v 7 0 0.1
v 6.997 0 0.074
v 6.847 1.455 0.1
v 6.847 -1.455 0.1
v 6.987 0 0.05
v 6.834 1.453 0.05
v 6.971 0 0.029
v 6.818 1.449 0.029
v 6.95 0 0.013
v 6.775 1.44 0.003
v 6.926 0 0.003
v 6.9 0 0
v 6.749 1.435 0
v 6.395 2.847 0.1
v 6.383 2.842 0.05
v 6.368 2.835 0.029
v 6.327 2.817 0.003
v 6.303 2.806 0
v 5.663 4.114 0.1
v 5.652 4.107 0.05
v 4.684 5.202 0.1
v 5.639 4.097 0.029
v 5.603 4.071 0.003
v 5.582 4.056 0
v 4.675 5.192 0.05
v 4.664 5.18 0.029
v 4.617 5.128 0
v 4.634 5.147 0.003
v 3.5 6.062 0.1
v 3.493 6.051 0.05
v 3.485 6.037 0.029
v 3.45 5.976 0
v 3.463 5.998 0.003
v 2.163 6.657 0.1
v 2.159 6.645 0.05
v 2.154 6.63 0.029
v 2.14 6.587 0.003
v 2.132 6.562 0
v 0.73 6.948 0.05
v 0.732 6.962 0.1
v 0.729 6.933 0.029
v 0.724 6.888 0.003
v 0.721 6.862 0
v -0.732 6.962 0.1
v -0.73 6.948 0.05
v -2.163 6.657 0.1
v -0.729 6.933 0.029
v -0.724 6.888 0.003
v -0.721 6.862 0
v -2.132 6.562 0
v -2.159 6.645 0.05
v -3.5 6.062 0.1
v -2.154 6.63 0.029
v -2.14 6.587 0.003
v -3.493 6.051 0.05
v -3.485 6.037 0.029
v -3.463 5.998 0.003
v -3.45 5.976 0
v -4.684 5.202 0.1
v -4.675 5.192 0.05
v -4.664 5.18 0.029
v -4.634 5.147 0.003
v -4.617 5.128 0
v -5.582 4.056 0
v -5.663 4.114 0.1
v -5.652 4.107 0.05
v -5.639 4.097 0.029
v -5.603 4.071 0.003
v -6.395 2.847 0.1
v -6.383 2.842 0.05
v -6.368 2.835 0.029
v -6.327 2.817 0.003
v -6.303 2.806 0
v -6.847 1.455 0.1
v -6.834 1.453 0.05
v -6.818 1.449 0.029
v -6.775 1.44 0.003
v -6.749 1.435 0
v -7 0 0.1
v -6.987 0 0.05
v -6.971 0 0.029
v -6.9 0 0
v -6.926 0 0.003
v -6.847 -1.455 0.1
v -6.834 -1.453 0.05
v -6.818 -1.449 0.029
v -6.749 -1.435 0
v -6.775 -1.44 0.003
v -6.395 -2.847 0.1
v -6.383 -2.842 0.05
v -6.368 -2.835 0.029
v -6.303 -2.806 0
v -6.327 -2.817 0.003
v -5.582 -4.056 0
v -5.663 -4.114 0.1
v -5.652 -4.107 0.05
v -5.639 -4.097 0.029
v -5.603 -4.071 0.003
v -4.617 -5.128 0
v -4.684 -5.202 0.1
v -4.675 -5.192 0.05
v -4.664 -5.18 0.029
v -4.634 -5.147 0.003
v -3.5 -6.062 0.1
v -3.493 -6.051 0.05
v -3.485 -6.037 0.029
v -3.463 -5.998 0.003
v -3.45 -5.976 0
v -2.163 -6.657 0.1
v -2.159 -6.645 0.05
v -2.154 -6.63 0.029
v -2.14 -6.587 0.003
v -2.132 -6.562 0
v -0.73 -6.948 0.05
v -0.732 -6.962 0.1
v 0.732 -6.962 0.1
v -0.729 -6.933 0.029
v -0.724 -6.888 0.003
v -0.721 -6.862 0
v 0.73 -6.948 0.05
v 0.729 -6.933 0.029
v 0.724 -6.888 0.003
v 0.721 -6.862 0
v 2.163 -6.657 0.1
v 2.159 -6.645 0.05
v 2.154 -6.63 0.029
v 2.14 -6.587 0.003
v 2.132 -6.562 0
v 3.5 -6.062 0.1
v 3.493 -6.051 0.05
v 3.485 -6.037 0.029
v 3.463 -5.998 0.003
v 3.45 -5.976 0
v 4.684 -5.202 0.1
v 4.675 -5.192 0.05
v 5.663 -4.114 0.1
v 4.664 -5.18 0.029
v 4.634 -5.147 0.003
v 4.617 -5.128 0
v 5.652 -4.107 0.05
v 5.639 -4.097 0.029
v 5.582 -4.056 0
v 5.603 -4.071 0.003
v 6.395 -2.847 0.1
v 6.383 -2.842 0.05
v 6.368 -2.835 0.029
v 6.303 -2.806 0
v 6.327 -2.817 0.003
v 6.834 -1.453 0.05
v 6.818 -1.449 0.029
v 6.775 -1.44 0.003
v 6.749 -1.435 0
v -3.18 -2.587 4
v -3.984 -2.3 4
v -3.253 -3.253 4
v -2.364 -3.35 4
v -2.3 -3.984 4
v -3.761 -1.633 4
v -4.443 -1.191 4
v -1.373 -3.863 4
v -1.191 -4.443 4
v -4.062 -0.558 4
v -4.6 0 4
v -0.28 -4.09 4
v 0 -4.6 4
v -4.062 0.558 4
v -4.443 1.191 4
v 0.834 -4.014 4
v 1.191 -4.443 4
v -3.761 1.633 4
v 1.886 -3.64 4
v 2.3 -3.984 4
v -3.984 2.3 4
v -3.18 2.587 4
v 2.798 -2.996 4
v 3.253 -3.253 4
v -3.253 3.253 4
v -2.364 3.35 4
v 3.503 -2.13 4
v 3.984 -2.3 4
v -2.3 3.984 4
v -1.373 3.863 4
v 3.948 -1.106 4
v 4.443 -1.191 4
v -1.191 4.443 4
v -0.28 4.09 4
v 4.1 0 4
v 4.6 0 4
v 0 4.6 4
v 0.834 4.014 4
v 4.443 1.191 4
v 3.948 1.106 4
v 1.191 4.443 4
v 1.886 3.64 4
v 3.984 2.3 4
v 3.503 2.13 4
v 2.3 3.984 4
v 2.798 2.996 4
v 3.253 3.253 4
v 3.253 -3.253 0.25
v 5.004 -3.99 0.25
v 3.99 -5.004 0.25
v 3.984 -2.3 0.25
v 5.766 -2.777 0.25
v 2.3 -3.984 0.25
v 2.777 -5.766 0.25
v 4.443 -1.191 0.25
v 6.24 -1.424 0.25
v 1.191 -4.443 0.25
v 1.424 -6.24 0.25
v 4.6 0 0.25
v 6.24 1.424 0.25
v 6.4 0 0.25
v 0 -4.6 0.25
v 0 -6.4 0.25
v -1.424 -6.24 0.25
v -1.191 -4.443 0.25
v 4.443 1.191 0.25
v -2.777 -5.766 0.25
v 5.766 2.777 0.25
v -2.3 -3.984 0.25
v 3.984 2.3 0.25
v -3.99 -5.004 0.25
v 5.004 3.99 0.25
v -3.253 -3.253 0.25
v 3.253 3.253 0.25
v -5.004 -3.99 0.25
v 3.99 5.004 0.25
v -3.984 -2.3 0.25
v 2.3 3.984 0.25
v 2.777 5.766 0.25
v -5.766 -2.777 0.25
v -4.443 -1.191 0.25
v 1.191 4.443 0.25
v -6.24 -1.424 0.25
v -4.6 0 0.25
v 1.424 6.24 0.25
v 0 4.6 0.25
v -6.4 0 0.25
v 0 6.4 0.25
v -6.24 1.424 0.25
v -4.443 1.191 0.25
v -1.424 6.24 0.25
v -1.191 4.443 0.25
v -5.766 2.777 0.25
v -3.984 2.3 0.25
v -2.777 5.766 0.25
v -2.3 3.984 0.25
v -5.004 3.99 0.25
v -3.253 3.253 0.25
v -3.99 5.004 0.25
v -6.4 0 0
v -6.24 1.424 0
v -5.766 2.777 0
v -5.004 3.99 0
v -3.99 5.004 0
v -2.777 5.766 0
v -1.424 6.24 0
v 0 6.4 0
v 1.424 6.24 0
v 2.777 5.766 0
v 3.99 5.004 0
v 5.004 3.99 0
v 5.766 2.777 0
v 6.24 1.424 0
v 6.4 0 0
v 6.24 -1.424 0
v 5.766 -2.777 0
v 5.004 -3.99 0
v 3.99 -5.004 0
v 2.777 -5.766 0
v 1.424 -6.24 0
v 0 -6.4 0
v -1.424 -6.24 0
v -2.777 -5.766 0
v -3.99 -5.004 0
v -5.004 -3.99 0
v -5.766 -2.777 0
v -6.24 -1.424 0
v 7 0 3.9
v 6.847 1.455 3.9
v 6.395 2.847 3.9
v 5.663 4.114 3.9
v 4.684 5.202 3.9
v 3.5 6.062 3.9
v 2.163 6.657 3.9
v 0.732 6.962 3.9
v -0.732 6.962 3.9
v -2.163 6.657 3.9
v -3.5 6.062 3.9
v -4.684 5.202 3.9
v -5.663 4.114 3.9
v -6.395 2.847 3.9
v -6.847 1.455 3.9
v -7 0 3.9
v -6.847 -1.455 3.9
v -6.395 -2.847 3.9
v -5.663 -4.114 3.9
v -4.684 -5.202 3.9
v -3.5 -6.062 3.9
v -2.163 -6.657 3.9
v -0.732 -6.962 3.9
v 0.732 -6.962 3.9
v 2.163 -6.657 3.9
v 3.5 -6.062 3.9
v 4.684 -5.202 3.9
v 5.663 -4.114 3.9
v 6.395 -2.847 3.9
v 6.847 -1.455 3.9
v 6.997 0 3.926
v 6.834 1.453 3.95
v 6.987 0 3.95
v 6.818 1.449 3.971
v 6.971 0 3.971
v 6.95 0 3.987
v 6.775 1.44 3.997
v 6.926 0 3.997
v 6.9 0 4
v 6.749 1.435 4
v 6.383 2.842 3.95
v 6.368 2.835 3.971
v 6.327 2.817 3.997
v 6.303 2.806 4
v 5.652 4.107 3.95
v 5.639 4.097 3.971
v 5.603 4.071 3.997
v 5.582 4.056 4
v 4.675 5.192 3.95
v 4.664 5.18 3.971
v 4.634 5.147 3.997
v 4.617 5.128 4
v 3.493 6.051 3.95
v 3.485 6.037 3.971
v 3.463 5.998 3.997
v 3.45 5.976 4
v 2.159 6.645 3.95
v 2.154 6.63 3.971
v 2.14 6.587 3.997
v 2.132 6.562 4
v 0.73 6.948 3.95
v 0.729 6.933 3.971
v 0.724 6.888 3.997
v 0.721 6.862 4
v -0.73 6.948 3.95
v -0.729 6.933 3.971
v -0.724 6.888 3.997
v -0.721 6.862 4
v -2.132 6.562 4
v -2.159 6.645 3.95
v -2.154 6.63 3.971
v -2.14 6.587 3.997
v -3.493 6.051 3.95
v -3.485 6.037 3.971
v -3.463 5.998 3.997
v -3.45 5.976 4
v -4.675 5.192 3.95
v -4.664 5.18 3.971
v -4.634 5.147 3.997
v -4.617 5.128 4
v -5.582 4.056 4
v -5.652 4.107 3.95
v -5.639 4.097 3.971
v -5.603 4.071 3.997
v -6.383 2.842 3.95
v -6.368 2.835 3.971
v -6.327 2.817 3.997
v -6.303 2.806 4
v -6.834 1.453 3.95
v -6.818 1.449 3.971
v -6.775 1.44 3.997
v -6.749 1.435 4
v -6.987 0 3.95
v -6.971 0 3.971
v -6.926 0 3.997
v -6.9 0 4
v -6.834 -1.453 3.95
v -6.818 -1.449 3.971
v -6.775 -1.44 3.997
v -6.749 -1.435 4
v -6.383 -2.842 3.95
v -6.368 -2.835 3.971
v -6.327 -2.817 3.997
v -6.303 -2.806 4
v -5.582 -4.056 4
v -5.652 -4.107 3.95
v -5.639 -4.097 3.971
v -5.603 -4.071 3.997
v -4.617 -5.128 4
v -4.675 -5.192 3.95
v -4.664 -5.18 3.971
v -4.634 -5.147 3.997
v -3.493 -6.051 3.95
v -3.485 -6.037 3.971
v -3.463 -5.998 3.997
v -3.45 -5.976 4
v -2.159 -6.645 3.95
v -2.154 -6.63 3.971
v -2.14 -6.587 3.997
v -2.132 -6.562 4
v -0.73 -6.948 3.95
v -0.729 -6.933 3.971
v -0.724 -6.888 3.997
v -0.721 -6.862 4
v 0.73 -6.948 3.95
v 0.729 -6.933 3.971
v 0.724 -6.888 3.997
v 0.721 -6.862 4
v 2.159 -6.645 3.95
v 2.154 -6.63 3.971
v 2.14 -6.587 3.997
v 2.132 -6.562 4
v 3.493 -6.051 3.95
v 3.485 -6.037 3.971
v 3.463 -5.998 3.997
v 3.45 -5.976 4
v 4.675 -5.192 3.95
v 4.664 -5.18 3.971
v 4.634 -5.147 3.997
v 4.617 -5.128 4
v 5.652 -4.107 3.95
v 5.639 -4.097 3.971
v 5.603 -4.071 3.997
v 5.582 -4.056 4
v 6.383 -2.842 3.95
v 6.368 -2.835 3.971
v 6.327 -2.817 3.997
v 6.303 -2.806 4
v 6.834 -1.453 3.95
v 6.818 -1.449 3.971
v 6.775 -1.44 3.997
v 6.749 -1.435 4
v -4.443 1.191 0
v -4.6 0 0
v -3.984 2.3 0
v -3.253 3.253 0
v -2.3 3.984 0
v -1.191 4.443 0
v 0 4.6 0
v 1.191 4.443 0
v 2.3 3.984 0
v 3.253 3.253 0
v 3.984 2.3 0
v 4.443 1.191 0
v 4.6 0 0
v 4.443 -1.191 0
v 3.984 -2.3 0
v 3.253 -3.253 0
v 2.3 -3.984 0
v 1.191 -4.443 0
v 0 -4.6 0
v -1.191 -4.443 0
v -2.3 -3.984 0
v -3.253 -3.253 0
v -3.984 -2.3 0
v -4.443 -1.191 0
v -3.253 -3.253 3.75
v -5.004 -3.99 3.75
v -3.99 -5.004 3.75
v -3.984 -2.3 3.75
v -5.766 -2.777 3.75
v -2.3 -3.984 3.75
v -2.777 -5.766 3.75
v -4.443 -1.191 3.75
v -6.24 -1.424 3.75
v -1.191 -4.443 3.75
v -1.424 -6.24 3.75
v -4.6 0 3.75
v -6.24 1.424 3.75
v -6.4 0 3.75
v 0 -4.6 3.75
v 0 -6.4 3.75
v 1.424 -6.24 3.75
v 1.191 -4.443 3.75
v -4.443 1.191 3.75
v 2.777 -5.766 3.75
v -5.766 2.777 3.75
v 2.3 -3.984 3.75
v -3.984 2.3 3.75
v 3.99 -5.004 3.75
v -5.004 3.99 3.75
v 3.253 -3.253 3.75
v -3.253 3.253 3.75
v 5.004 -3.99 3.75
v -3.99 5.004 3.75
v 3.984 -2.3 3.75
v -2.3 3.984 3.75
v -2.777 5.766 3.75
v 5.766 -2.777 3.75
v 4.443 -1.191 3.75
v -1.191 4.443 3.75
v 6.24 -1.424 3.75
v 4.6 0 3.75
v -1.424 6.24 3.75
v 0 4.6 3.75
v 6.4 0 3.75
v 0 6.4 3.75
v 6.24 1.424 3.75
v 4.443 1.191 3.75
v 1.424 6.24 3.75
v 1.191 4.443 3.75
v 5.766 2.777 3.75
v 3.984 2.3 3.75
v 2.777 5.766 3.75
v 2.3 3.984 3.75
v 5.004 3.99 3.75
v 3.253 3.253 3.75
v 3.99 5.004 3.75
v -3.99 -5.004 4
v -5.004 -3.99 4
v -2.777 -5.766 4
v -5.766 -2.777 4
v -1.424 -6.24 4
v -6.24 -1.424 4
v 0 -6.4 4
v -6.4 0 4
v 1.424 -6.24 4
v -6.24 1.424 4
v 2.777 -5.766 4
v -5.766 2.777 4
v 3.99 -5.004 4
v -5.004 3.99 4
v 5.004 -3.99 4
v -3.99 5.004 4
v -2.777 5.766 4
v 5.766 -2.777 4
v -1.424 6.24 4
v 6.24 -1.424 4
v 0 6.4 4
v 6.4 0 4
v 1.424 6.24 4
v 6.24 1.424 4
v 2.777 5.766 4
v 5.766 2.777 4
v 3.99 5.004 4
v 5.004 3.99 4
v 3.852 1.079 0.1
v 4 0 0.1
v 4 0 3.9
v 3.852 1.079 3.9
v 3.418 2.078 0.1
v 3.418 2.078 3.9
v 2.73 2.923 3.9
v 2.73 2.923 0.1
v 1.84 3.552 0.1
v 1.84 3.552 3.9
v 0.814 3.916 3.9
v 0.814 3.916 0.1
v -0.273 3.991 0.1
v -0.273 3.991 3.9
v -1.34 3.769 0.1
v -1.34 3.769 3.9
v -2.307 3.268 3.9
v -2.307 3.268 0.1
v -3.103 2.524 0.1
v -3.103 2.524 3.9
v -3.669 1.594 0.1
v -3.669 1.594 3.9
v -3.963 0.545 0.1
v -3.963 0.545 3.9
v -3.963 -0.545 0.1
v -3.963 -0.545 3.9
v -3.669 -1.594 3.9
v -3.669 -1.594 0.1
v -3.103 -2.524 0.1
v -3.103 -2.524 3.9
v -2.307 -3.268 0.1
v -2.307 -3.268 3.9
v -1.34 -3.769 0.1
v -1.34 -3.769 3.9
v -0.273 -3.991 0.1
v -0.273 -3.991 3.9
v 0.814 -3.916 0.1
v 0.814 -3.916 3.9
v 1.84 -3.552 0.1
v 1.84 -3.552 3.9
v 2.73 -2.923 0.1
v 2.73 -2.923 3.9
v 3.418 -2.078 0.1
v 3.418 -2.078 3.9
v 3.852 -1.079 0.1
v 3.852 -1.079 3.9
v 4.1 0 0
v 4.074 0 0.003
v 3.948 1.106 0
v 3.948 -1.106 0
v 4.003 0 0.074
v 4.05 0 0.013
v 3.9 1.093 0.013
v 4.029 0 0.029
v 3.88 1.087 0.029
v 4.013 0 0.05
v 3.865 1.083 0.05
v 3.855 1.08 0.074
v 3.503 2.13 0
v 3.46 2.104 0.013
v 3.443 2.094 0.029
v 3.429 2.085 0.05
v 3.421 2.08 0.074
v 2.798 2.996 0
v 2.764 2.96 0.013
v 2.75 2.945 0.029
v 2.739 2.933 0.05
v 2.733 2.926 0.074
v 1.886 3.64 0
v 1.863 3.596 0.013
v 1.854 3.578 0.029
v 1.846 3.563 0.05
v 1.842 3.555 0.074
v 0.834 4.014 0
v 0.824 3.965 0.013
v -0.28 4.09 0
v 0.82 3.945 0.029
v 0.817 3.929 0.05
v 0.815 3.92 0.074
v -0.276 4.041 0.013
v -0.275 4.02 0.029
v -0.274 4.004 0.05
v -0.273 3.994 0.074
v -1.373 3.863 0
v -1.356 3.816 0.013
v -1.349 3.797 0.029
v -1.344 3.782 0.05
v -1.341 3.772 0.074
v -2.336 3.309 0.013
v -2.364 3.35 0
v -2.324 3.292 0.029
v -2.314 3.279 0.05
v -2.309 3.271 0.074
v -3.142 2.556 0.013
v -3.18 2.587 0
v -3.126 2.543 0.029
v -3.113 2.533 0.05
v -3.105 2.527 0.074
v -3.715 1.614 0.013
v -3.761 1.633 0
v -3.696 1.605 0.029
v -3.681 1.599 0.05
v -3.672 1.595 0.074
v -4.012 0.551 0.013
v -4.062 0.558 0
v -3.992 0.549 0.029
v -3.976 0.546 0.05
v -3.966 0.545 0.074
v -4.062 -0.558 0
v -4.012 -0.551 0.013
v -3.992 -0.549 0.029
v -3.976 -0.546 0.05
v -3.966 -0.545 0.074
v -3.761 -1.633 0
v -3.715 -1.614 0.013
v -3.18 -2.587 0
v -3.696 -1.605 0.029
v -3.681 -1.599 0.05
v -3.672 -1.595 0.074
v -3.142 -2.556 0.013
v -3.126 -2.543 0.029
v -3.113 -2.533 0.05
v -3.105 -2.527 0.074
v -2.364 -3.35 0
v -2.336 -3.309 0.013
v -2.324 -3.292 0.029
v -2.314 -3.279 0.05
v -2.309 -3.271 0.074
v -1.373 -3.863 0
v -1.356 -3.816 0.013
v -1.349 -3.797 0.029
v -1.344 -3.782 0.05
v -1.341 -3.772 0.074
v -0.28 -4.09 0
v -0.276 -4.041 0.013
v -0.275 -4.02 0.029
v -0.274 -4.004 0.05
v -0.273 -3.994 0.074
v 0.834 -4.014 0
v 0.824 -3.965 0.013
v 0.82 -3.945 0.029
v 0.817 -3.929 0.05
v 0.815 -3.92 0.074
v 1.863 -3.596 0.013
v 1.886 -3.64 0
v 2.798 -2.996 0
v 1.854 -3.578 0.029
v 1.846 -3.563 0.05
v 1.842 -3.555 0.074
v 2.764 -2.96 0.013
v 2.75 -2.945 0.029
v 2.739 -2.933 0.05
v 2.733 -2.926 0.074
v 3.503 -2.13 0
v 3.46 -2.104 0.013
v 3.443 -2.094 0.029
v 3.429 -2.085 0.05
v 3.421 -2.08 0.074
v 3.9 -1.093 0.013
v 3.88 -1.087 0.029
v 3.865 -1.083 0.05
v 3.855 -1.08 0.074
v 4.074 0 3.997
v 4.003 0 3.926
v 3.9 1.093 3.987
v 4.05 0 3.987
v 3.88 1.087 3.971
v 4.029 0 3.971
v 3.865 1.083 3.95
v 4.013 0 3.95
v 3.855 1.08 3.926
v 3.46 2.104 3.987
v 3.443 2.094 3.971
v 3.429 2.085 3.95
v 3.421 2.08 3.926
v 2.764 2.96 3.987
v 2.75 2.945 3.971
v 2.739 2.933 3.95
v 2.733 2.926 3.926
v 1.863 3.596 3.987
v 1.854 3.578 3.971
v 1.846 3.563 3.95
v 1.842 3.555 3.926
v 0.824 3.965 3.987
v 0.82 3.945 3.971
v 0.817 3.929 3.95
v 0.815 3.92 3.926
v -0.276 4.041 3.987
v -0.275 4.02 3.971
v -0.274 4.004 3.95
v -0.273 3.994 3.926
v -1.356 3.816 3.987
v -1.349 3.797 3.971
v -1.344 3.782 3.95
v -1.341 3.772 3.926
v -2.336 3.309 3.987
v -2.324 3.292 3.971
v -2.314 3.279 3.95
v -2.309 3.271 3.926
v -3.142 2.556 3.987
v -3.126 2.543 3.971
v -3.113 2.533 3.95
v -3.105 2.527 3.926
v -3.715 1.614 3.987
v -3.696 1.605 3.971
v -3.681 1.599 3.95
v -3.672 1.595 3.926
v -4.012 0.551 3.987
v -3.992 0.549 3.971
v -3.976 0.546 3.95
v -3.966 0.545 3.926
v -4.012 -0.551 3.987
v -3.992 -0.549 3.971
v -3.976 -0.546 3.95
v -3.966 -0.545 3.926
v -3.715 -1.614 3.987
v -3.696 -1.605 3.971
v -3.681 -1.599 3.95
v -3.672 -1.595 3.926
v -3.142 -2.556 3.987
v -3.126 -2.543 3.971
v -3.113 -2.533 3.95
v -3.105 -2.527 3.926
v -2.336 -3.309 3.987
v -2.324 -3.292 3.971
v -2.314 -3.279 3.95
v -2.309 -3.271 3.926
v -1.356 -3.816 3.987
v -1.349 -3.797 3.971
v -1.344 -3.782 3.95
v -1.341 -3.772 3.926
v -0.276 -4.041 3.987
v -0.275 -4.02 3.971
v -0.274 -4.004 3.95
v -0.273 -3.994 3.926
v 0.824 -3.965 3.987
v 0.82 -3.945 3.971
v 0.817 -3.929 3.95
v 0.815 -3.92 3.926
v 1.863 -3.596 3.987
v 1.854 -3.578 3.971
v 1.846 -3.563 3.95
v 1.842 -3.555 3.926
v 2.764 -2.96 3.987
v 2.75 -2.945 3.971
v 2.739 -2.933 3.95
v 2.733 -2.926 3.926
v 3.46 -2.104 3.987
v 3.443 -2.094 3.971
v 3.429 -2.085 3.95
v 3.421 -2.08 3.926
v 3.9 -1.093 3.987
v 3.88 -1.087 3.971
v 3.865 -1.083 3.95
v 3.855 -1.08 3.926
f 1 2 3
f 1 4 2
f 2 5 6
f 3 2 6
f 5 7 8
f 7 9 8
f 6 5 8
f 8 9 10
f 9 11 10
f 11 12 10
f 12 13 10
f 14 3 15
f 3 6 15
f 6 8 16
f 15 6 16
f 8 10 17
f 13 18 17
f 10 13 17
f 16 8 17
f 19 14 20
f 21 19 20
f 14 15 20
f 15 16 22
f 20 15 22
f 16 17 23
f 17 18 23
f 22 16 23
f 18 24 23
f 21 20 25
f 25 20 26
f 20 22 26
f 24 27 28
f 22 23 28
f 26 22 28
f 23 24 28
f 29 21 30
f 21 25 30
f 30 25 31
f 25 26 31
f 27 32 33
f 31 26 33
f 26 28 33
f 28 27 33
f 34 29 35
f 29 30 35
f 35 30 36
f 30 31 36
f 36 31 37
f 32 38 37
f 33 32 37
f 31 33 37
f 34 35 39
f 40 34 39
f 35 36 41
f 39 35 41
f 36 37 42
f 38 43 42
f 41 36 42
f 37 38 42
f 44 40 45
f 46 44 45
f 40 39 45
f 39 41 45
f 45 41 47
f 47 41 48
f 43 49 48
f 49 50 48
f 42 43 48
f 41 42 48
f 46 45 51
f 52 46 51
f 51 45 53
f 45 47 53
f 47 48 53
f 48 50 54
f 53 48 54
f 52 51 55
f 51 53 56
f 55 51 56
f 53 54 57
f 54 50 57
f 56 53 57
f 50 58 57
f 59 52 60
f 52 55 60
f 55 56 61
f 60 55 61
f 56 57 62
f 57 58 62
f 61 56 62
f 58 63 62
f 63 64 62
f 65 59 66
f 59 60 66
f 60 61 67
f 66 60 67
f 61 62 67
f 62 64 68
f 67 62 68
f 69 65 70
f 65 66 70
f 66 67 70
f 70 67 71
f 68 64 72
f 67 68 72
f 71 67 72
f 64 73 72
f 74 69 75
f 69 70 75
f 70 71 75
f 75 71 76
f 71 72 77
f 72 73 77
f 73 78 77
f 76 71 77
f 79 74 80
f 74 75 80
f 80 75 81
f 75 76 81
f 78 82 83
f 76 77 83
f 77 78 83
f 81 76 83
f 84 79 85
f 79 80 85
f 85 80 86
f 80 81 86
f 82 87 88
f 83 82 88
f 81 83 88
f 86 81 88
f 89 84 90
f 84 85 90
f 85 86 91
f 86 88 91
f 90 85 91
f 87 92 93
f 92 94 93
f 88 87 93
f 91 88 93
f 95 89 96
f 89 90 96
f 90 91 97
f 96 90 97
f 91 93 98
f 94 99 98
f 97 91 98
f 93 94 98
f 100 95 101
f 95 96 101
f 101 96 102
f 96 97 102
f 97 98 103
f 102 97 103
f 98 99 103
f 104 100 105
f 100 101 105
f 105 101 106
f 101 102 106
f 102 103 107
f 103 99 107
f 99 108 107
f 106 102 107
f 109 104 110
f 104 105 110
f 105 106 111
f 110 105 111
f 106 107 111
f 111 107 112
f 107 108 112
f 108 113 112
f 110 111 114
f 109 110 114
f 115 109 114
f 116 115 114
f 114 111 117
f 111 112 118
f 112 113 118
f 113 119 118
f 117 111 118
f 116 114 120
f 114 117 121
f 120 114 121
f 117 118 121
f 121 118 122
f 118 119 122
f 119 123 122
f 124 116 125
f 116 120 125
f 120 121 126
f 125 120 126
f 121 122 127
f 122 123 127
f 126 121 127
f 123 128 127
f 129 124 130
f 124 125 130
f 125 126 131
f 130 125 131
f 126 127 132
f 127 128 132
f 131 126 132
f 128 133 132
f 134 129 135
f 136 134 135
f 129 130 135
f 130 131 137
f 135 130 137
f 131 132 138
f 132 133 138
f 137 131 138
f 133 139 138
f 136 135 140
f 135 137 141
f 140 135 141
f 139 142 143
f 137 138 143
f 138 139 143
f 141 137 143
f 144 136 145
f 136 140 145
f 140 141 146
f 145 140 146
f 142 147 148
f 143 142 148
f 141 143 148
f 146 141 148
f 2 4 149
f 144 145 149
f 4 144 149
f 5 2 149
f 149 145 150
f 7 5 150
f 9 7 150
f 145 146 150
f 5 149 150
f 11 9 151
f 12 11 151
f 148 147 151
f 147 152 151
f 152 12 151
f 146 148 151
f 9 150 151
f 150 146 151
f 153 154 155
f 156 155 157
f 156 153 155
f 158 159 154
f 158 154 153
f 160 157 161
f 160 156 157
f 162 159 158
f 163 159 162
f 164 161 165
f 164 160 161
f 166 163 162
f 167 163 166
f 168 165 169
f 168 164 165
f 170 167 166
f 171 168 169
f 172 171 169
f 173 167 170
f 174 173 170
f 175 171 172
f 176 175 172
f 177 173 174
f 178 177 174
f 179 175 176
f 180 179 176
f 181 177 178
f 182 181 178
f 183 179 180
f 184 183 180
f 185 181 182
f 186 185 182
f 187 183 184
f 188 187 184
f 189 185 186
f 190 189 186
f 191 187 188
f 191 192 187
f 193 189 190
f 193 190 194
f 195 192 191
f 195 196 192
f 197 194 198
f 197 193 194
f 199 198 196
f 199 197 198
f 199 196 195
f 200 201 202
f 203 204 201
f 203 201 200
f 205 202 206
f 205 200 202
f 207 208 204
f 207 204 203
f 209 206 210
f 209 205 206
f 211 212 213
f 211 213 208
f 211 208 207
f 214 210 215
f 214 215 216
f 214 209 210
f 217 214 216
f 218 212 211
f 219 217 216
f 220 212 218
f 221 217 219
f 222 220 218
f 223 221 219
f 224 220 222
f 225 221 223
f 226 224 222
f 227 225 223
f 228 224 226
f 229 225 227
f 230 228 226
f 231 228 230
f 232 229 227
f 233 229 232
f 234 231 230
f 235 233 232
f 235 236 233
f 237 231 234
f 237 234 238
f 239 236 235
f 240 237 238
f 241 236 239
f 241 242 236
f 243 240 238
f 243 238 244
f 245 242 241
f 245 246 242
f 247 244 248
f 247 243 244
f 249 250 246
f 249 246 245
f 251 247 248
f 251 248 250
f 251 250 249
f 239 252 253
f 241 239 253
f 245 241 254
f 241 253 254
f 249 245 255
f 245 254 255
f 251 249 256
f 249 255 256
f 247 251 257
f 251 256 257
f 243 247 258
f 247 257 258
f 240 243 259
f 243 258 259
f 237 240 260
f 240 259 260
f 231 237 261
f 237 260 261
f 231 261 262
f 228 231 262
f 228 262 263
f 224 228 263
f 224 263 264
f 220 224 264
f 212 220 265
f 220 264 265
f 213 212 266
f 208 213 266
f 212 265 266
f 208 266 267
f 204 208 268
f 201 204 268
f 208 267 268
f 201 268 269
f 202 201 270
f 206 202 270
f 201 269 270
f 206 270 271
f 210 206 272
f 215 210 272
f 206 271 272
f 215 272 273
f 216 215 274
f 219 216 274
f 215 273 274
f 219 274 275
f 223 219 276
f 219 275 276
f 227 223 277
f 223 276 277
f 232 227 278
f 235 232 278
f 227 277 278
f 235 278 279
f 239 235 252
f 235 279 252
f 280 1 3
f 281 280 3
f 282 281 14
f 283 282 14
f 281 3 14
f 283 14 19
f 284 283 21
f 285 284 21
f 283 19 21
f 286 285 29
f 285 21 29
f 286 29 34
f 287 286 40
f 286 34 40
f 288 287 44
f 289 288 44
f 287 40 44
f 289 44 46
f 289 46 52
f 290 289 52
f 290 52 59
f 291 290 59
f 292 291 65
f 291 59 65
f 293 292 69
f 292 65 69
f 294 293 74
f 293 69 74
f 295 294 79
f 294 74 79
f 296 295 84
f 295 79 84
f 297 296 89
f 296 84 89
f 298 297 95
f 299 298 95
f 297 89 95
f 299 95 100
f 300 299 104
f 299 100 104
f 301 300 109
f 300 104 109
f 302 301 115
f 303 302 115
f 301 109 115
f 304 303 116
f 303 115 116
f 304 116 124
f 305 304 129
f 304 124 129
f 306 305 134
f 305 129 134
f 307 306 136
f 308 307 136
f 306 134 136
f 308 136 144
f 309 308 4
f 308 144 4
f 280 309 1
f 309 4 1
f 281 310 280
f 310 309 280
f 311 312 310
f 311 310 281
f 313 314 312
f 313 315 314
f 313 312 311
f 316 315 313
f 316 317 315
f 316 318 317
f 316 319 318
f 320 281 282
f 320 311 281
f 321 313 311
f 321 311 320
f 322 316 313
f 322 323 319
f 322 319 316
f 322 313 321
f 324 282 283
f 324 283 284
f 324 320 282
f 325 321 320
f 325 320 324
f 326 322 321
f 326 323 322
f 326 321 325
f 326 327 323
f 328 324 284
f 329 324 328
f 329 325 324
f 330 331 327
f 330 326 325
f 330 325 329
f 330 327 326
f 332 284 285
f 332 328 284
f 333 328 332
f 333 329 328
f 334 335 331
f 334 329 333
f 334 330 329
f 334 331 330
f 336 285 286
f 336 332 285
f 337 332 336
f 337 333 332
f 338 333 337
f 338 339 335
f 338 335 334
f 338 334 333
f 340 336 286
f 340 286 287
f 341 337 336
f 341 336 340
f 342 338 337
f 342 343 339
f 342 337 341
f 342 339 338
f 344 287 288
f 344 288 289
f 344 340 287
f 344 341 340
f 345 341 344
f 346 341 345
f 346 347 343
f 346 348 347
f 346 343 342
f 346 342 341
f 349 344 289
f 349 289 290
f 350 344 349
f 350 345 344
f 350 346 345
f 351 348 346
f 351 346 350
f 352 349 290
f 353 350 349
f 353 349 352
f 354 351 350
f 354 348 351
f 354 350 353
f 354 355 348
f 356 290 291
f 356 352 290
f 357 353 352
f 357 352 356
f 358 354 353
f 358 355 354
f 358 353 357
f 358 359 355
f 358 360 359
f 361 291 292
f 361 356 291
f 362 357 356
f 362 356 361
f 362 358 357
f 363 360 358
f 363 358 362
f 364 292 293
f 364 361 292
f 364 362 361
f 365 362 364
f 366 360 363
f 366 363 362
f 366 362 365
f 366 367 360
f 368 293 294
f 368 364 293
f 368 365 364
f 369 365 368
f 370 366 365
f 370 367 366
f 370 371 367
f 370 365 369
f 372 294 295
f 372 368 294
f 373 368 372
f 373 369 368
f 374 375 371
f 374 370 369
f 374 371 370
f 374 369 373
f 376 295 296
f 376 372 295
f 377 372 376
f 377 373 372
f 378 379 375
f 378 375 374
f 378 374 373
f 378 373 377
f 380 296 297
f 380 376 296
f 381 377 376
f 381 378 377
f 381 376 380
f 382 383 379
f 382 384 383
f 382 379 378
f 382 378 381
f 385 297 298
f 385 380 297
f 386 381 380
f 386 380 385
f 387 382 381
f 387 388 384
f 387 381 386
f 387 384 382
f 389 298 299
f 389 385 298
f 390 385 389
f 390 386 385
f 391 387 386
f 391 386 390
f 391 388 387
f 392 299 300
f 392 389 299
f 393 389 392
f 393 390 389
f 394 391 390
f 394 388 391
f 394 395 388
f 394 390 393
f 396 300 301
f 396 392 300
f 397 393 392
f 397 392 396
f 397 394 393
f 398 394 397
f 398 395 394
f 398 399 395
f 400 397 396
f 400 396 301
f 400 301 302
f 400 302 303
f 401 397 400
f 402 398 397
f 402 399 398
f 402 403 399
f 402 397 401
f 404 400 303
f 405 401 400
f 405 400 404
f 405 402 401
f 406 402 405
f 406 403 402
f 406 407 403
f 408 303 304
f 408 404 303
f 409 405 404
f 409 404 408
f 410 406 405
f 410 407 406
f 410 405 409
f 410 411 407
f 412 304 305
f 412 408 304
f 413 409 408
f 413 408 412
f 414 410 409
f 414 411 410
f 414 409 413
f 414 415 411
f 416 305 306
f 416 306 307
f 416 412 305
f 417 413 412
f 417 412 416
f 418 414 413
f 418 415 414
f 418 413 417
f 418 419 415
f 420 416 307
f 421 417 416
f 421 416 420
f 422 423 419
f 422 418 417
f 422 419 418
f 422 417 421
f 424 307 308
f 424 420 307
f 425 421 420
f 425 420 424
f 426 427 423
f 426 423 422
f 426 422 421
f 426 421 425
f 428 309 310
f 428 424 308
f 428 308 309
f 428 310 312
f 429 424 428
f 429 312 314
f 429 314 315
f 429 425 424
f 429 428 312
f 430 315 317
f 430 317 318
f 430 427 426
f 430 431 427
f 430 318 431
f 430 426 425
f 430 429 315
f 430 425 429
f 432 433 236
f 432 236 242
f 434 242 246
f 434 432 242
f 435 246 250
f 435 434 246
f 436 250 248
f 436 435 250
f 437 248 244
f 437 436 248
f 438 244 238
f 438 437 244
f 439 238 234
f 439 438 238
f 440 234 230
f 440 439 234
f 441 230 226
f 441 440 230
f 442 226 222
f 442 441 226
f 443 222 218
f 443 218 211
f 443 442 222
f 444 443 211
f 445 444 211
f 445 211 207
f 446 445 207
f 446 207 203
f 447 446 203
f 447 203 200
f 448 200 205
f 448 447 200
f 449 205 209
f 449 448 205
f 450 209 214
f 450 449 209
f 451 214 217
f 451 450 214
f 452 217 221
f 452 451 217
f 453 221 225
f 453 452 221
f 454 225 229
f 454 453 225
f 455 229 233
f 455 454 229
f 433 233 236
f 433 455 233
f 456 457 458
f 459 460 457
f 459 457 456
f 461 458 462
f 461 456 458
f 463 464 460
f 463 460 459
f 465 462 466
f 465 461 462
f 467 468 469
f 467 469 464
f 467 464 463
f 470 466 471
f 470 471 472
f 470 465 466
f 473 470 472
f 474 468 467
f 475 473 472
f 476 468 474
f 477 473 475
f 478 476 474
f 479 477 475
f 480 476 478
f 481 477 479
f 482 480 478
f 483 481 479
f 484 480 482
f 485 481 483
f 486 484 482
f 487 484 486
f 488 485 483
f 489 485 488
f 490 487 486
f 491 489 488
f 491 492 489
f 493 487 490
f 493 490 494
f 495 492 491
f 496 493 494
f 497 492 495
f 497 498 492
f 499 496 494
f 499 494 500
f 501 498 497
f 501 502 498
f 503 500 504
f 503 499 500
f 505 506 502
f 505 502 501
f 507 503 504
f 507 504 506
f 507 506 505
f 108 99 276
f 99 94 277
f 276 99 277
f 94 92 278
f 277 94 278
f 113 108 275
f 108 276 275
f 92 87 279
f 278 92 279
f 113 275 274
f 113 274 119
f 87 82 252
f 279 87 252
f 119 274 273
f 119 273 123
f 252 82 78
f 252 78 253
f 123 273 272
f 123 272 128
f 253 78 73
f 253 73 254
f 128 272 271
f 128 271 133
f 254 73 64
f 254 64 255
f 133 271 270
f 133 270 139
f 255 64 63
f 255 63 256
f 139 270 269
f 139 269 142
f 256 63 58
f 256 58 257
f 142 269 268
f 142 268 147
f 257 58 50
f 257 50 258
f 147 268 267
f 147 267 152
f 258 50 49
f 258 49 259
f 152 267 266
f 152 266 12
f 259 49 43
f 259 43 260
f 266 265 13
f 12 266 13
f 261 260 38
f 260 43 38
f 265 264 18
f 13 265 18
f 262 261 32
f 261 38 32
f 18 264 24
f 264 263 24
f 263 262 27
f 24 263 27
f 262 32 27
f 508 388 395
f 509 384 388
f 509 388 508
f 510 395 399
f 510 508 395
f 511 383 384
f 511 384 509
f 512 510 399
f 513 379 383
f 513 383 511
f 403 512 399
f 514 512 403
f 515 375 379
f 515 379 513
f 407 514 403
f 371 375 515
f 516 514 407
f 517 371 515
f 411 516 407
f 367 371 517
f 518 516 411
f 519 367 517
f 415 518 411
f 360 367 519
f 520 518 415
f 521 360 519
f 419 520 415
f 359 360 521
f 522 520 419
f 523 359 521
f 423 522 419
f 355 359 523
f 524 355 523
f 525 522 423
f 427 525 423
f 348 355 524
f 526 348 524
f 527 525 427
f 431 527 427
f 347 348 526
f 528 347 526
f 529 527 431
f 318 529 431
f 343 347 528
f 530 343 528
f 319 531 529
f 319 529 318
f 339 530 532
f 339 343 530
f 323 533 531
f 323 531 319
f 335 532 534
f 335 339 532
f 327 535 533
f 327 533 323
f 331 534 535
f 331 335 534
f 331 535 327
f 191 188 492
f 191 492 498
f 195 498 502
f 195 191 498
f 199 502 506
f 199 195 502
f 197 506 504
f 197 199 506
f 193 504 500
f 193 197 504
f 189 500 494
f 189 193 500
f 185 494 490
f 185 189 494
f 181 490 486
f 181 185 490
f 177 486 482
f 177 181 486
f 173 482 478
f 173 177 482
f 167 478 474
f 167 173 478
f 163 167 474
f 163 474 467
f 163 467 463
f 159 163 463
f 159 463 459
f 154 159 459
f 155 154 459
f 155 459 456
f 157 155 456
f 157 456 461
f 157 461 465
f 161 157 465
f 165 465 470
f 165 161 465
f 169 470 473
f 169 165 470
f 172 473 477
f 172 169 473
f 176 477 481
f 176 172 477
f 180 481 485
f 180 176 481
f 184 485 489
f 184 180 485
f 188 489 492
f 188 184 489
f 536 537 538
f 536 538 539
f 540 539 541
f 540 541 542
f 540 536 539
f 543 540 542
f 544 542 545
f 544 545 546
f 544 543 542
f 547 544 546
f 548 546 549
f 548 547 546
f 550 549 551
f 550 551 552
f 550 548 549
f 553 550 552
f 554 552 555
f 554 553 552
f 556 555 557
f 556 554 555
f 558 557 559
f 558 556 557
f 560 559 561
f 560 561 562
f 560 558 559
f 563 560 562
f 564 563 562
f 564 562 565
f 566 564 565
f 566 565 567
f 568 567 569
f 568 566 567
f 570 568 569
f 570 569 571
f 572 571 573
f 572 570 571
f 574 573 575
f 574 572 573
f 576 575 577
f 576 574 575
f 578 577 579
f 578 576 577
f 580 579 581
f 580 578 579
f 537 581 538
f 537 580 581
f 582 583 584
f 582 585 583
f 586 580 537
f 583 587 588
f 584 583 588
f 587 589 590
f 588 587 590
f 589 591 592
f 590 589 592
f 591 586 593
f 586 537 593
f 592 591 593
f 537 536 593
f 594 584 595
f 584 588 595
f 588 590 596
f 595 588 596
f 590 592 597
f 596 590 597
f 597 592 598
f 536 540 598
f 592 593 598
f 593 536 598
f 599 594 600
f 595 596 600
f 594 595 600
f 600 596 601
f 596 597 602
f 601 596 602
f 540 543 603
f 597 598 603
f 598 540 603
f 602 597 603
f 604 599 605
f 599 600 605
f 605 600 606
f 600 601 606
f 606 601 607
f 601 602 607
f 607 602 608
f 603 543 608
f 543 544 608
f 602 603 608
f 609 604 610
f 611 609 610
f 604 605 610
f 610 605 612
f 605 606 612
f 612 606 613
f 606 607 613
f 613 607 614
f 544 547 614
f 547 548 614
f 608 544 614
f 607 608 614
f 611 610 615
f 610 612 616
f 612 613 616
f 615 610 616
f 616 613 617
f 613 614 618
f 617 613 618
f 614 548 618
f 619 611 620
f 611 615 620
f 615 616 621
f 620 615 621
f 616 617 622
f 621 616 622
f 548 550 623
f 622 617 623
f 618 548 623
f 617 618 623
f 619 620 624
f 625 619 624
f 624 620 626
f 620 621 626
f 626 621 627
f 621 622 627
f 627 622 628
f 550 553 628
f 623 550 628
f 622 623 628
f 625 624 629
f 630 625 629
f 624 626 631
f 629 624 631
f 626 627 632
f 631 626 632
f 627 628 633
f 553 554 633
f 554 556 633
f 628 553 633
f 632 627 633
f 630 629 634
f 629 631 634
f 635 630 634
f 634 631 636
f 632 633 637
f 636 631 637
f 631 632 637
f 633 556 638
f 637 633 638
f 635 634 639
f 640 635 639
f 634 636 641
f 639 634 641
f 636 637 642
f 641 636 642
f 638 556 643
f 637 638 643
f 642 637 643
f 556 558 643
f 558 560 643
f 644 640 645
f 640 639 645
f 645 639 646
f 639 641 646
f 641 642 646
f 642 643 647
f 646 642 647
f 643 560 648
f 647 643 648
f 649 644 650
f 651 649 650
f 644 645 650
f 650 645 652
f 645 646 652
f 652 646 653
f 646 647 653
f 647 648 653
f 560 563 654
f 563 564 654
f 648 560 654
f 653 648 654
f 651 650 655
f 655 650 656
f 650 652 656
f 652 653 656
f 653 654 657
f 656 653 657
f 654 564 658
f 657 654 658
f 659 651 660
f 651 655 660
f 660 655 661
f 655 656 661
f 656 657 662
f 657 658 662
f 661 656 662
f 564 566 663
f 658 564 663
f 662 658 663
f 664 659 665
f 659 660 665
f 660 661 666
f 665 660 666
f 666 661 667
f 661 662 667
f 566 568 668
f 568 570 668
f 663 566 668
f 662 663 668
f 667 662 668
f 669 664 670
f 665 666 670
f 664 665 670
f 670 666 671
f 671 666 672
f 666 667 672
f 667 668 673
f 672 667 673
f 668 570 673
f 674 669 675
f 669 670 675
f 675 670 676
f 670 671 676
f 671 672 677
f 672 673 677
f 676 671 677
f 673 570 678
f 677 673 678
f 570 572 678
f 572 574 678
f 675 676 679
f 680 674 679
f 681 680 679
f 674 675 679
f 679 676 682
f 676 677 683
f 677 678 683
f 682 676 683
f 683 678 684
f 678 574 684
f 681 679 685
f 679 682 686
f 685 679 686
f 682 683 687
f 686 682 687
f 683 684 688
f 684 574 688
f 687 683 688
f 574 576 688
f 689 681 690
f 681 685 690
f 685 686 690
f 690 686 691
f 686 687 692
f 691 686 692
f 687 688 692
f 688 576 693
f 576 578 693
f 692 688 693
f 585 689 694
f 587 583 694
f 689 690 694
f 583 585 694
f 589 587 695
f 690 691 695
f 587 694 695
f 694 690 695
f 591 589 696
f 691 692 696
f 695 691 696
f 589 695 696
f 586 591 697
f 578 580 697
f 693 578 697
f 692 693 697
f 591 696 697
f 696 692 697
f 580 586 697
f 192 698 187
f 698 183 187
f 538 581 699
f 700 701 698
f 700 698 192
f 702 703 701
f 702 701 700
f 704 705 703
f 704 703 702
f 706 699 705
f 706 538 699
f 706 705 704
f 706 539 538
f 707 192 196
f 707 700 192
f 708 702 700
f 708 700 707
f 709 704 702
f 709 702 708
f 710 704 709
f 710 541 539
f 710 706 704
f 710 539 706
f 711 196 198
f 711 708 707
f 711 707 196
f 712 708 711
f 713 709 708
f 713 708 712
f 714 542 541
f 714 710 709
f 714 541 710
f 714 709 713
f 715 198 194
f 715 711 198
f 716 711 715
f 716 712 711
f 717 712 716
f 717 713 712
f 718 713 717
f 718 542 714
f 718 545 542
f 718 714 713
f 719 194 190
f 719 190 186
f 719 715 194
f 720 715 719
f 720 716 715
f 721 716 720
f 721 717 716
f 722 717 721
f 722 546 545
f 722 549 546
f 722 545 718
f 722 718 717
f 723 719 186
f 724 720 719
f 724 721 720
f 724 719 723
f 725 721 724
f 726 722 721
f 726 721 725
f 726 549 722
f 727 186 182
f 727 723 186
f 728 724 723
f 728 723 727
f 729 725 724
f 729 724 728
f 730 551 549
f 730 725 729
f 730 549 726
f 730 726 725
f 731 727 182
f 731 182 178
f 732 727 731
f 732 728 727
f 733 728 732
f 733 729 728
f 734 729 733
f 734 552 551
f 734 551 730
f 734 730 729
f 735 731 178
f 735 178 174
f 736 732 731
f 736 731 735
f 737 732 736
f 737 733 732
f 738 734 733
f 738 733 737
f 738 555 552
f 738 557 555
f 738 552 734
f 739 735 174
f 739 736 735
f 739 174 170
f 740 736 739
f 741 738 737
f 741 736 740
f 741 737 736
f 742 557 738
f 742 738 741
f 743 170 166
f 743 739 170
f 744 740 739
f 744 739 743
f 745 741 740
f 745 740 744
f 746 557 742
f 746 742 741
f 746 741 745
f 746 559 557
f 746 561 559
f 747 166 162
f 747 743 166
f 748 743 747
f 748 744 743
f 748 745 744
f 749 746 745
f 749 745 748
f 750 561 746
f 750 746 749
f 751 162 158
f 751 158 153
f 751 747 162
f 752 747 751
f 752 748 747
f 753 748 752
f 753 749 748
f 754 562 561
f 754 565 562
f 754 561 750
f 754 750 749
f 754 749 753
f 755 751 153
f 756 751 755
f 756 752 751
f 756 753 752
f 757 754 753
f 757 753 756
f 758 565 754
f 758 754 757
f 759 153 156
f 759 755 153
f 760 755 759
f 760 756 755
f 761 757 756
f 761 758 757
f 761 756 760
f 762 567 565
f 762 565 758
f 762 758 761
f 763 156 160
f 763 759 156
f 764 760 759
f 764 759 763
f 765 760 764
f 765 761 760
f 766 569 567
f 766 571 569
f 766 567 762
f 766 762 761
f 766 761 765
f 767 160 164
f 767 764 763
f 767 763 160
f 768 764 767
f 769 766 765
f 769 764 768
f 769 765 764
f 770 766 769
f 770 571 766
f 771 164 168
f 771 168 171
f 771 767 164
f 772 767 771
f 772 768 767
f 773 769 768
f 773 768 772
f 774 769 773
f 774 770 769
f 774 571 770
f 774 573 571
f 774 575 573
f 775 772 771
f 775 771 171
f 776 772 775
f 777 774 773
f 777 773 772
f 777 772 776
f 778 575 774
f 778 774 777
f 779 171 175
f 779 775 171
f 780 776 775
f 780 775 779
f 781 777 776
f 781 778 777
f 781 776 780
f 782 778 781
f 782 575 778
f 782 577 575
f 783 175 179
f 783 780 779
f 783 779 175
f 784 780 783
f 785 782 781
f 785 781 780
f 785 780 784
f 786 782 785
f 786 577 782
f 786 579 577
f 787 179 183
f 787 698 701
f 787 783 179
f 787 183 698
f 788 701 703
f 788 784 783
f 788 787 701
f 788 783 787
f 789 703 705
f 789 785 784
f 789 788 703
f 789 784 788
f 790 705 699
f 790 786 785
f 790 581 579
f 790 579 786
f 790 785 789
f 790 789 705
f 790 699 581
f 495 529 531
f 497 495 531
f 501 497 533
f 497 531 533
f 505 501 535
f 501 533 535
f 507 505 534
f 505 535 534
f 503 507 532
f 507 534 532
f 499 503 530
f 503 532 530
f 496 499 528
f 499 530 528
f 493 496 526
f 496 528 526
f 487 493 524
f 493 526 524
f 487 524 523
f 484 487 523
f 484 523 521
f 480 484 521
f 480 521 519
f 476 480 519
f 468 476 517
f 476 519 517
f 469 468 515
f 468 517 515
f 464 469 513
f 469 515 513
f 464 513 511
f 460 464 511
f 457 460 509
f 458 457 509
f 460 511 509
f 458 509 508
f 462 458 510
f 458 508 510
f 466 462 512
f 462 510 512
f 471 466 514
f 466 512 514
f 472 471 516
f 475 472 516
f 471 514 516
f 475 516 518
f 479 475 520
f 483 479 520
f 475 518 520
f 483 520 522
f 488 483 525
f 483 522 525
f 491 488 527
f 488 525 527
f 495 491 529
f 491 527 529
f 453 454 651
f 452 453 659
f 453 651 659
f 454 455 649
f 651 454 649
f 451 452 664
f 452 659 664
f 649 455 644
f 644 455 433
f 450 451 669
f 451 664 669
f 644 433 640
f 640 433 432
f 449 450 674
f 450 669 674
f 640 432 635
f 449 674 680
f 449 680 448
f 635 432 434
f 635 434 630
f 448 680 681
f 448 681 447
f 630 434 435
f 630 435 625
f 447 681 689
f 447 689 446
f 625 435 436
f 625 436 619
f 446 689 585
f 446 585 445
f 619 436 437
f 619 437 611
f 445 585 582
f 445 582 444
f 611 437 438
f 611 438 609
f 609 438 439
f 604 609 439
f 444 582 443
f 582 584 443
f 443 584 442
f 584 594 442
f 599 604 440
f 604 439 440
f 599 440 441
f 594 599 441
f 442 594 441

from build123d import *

# Parameters (mm, degrees)
SKETCH1_R           = 7
SKETCH1_R_2         = 4
BOSS_EXTRUDE1_DEPTH = 4
SKETCH2_R           = 6.4
SKETCH2_R_2         = 4.6
CUT_EXTRUDE1_DEPTH  = 0.25
SKETCH3_R           = 6.4
SKETCH3_R_2         = 4.6
CUT_EXTRUDE2_DEPTH  = 0.25
FILLET1_R           = 0.1
FILLET2_R           = 0.1


with BuildPart() as part:
    # Sketch1 → Boss-Extrude1 (new body)
    with BuildSketch(Plane.XY):
        Circle(SKETCH1_R)
        Circle(SKETCH1_R_2, mode=Mode.SUBTRACT)
    extrude(amount=BOSS_EXTRUDE1_DEPTH)

    # Sketch2 → Cut-Extrude1 (cut)
    with BuildSketch(Plane.XY.offset(4)):
        Circle(SKETCH2_R)
        Circle(SKETCH2_R_2, mode=Mode.SUBTRACT)
    extrude(amount=-CUT_EXTRUDE1_DEPTH, mode=Mode.SUBTRACT)

    # Sketch3 → Cut-Extrude2 (cut)
    with BuildSketch(Plane(origin=(0, 0, 0), x_dir=(-1, 0, 0), z_dir=(0, 0, -1))):
        Circle(SKETCH3_R)
        Circle(SKETCH3_R_2, mode=Mode.SUBTRACT)
    extrude(amount=-CUT_EXTRUDE2_DEPTH, mode=Mode.SUBTRACT)

    # Fillet1
    fillet1_edges = [part.edges().sort_by_distance(p)[0] for p in [
        (-7, 0, 0),
        (-7, 0, 4),
    ]]
    fillet(fillet1_edges, radius=FILLET1_R)

    # Fillet2
    fillet2_edges = [part.edges().sort_by_distance(p)[0] for p in [
        (-4, 0, 0),
        (-4, 0, 4),
    ]]
    fillet(fillet2_edges, radius=FILLET2_R)


solid = part.part
